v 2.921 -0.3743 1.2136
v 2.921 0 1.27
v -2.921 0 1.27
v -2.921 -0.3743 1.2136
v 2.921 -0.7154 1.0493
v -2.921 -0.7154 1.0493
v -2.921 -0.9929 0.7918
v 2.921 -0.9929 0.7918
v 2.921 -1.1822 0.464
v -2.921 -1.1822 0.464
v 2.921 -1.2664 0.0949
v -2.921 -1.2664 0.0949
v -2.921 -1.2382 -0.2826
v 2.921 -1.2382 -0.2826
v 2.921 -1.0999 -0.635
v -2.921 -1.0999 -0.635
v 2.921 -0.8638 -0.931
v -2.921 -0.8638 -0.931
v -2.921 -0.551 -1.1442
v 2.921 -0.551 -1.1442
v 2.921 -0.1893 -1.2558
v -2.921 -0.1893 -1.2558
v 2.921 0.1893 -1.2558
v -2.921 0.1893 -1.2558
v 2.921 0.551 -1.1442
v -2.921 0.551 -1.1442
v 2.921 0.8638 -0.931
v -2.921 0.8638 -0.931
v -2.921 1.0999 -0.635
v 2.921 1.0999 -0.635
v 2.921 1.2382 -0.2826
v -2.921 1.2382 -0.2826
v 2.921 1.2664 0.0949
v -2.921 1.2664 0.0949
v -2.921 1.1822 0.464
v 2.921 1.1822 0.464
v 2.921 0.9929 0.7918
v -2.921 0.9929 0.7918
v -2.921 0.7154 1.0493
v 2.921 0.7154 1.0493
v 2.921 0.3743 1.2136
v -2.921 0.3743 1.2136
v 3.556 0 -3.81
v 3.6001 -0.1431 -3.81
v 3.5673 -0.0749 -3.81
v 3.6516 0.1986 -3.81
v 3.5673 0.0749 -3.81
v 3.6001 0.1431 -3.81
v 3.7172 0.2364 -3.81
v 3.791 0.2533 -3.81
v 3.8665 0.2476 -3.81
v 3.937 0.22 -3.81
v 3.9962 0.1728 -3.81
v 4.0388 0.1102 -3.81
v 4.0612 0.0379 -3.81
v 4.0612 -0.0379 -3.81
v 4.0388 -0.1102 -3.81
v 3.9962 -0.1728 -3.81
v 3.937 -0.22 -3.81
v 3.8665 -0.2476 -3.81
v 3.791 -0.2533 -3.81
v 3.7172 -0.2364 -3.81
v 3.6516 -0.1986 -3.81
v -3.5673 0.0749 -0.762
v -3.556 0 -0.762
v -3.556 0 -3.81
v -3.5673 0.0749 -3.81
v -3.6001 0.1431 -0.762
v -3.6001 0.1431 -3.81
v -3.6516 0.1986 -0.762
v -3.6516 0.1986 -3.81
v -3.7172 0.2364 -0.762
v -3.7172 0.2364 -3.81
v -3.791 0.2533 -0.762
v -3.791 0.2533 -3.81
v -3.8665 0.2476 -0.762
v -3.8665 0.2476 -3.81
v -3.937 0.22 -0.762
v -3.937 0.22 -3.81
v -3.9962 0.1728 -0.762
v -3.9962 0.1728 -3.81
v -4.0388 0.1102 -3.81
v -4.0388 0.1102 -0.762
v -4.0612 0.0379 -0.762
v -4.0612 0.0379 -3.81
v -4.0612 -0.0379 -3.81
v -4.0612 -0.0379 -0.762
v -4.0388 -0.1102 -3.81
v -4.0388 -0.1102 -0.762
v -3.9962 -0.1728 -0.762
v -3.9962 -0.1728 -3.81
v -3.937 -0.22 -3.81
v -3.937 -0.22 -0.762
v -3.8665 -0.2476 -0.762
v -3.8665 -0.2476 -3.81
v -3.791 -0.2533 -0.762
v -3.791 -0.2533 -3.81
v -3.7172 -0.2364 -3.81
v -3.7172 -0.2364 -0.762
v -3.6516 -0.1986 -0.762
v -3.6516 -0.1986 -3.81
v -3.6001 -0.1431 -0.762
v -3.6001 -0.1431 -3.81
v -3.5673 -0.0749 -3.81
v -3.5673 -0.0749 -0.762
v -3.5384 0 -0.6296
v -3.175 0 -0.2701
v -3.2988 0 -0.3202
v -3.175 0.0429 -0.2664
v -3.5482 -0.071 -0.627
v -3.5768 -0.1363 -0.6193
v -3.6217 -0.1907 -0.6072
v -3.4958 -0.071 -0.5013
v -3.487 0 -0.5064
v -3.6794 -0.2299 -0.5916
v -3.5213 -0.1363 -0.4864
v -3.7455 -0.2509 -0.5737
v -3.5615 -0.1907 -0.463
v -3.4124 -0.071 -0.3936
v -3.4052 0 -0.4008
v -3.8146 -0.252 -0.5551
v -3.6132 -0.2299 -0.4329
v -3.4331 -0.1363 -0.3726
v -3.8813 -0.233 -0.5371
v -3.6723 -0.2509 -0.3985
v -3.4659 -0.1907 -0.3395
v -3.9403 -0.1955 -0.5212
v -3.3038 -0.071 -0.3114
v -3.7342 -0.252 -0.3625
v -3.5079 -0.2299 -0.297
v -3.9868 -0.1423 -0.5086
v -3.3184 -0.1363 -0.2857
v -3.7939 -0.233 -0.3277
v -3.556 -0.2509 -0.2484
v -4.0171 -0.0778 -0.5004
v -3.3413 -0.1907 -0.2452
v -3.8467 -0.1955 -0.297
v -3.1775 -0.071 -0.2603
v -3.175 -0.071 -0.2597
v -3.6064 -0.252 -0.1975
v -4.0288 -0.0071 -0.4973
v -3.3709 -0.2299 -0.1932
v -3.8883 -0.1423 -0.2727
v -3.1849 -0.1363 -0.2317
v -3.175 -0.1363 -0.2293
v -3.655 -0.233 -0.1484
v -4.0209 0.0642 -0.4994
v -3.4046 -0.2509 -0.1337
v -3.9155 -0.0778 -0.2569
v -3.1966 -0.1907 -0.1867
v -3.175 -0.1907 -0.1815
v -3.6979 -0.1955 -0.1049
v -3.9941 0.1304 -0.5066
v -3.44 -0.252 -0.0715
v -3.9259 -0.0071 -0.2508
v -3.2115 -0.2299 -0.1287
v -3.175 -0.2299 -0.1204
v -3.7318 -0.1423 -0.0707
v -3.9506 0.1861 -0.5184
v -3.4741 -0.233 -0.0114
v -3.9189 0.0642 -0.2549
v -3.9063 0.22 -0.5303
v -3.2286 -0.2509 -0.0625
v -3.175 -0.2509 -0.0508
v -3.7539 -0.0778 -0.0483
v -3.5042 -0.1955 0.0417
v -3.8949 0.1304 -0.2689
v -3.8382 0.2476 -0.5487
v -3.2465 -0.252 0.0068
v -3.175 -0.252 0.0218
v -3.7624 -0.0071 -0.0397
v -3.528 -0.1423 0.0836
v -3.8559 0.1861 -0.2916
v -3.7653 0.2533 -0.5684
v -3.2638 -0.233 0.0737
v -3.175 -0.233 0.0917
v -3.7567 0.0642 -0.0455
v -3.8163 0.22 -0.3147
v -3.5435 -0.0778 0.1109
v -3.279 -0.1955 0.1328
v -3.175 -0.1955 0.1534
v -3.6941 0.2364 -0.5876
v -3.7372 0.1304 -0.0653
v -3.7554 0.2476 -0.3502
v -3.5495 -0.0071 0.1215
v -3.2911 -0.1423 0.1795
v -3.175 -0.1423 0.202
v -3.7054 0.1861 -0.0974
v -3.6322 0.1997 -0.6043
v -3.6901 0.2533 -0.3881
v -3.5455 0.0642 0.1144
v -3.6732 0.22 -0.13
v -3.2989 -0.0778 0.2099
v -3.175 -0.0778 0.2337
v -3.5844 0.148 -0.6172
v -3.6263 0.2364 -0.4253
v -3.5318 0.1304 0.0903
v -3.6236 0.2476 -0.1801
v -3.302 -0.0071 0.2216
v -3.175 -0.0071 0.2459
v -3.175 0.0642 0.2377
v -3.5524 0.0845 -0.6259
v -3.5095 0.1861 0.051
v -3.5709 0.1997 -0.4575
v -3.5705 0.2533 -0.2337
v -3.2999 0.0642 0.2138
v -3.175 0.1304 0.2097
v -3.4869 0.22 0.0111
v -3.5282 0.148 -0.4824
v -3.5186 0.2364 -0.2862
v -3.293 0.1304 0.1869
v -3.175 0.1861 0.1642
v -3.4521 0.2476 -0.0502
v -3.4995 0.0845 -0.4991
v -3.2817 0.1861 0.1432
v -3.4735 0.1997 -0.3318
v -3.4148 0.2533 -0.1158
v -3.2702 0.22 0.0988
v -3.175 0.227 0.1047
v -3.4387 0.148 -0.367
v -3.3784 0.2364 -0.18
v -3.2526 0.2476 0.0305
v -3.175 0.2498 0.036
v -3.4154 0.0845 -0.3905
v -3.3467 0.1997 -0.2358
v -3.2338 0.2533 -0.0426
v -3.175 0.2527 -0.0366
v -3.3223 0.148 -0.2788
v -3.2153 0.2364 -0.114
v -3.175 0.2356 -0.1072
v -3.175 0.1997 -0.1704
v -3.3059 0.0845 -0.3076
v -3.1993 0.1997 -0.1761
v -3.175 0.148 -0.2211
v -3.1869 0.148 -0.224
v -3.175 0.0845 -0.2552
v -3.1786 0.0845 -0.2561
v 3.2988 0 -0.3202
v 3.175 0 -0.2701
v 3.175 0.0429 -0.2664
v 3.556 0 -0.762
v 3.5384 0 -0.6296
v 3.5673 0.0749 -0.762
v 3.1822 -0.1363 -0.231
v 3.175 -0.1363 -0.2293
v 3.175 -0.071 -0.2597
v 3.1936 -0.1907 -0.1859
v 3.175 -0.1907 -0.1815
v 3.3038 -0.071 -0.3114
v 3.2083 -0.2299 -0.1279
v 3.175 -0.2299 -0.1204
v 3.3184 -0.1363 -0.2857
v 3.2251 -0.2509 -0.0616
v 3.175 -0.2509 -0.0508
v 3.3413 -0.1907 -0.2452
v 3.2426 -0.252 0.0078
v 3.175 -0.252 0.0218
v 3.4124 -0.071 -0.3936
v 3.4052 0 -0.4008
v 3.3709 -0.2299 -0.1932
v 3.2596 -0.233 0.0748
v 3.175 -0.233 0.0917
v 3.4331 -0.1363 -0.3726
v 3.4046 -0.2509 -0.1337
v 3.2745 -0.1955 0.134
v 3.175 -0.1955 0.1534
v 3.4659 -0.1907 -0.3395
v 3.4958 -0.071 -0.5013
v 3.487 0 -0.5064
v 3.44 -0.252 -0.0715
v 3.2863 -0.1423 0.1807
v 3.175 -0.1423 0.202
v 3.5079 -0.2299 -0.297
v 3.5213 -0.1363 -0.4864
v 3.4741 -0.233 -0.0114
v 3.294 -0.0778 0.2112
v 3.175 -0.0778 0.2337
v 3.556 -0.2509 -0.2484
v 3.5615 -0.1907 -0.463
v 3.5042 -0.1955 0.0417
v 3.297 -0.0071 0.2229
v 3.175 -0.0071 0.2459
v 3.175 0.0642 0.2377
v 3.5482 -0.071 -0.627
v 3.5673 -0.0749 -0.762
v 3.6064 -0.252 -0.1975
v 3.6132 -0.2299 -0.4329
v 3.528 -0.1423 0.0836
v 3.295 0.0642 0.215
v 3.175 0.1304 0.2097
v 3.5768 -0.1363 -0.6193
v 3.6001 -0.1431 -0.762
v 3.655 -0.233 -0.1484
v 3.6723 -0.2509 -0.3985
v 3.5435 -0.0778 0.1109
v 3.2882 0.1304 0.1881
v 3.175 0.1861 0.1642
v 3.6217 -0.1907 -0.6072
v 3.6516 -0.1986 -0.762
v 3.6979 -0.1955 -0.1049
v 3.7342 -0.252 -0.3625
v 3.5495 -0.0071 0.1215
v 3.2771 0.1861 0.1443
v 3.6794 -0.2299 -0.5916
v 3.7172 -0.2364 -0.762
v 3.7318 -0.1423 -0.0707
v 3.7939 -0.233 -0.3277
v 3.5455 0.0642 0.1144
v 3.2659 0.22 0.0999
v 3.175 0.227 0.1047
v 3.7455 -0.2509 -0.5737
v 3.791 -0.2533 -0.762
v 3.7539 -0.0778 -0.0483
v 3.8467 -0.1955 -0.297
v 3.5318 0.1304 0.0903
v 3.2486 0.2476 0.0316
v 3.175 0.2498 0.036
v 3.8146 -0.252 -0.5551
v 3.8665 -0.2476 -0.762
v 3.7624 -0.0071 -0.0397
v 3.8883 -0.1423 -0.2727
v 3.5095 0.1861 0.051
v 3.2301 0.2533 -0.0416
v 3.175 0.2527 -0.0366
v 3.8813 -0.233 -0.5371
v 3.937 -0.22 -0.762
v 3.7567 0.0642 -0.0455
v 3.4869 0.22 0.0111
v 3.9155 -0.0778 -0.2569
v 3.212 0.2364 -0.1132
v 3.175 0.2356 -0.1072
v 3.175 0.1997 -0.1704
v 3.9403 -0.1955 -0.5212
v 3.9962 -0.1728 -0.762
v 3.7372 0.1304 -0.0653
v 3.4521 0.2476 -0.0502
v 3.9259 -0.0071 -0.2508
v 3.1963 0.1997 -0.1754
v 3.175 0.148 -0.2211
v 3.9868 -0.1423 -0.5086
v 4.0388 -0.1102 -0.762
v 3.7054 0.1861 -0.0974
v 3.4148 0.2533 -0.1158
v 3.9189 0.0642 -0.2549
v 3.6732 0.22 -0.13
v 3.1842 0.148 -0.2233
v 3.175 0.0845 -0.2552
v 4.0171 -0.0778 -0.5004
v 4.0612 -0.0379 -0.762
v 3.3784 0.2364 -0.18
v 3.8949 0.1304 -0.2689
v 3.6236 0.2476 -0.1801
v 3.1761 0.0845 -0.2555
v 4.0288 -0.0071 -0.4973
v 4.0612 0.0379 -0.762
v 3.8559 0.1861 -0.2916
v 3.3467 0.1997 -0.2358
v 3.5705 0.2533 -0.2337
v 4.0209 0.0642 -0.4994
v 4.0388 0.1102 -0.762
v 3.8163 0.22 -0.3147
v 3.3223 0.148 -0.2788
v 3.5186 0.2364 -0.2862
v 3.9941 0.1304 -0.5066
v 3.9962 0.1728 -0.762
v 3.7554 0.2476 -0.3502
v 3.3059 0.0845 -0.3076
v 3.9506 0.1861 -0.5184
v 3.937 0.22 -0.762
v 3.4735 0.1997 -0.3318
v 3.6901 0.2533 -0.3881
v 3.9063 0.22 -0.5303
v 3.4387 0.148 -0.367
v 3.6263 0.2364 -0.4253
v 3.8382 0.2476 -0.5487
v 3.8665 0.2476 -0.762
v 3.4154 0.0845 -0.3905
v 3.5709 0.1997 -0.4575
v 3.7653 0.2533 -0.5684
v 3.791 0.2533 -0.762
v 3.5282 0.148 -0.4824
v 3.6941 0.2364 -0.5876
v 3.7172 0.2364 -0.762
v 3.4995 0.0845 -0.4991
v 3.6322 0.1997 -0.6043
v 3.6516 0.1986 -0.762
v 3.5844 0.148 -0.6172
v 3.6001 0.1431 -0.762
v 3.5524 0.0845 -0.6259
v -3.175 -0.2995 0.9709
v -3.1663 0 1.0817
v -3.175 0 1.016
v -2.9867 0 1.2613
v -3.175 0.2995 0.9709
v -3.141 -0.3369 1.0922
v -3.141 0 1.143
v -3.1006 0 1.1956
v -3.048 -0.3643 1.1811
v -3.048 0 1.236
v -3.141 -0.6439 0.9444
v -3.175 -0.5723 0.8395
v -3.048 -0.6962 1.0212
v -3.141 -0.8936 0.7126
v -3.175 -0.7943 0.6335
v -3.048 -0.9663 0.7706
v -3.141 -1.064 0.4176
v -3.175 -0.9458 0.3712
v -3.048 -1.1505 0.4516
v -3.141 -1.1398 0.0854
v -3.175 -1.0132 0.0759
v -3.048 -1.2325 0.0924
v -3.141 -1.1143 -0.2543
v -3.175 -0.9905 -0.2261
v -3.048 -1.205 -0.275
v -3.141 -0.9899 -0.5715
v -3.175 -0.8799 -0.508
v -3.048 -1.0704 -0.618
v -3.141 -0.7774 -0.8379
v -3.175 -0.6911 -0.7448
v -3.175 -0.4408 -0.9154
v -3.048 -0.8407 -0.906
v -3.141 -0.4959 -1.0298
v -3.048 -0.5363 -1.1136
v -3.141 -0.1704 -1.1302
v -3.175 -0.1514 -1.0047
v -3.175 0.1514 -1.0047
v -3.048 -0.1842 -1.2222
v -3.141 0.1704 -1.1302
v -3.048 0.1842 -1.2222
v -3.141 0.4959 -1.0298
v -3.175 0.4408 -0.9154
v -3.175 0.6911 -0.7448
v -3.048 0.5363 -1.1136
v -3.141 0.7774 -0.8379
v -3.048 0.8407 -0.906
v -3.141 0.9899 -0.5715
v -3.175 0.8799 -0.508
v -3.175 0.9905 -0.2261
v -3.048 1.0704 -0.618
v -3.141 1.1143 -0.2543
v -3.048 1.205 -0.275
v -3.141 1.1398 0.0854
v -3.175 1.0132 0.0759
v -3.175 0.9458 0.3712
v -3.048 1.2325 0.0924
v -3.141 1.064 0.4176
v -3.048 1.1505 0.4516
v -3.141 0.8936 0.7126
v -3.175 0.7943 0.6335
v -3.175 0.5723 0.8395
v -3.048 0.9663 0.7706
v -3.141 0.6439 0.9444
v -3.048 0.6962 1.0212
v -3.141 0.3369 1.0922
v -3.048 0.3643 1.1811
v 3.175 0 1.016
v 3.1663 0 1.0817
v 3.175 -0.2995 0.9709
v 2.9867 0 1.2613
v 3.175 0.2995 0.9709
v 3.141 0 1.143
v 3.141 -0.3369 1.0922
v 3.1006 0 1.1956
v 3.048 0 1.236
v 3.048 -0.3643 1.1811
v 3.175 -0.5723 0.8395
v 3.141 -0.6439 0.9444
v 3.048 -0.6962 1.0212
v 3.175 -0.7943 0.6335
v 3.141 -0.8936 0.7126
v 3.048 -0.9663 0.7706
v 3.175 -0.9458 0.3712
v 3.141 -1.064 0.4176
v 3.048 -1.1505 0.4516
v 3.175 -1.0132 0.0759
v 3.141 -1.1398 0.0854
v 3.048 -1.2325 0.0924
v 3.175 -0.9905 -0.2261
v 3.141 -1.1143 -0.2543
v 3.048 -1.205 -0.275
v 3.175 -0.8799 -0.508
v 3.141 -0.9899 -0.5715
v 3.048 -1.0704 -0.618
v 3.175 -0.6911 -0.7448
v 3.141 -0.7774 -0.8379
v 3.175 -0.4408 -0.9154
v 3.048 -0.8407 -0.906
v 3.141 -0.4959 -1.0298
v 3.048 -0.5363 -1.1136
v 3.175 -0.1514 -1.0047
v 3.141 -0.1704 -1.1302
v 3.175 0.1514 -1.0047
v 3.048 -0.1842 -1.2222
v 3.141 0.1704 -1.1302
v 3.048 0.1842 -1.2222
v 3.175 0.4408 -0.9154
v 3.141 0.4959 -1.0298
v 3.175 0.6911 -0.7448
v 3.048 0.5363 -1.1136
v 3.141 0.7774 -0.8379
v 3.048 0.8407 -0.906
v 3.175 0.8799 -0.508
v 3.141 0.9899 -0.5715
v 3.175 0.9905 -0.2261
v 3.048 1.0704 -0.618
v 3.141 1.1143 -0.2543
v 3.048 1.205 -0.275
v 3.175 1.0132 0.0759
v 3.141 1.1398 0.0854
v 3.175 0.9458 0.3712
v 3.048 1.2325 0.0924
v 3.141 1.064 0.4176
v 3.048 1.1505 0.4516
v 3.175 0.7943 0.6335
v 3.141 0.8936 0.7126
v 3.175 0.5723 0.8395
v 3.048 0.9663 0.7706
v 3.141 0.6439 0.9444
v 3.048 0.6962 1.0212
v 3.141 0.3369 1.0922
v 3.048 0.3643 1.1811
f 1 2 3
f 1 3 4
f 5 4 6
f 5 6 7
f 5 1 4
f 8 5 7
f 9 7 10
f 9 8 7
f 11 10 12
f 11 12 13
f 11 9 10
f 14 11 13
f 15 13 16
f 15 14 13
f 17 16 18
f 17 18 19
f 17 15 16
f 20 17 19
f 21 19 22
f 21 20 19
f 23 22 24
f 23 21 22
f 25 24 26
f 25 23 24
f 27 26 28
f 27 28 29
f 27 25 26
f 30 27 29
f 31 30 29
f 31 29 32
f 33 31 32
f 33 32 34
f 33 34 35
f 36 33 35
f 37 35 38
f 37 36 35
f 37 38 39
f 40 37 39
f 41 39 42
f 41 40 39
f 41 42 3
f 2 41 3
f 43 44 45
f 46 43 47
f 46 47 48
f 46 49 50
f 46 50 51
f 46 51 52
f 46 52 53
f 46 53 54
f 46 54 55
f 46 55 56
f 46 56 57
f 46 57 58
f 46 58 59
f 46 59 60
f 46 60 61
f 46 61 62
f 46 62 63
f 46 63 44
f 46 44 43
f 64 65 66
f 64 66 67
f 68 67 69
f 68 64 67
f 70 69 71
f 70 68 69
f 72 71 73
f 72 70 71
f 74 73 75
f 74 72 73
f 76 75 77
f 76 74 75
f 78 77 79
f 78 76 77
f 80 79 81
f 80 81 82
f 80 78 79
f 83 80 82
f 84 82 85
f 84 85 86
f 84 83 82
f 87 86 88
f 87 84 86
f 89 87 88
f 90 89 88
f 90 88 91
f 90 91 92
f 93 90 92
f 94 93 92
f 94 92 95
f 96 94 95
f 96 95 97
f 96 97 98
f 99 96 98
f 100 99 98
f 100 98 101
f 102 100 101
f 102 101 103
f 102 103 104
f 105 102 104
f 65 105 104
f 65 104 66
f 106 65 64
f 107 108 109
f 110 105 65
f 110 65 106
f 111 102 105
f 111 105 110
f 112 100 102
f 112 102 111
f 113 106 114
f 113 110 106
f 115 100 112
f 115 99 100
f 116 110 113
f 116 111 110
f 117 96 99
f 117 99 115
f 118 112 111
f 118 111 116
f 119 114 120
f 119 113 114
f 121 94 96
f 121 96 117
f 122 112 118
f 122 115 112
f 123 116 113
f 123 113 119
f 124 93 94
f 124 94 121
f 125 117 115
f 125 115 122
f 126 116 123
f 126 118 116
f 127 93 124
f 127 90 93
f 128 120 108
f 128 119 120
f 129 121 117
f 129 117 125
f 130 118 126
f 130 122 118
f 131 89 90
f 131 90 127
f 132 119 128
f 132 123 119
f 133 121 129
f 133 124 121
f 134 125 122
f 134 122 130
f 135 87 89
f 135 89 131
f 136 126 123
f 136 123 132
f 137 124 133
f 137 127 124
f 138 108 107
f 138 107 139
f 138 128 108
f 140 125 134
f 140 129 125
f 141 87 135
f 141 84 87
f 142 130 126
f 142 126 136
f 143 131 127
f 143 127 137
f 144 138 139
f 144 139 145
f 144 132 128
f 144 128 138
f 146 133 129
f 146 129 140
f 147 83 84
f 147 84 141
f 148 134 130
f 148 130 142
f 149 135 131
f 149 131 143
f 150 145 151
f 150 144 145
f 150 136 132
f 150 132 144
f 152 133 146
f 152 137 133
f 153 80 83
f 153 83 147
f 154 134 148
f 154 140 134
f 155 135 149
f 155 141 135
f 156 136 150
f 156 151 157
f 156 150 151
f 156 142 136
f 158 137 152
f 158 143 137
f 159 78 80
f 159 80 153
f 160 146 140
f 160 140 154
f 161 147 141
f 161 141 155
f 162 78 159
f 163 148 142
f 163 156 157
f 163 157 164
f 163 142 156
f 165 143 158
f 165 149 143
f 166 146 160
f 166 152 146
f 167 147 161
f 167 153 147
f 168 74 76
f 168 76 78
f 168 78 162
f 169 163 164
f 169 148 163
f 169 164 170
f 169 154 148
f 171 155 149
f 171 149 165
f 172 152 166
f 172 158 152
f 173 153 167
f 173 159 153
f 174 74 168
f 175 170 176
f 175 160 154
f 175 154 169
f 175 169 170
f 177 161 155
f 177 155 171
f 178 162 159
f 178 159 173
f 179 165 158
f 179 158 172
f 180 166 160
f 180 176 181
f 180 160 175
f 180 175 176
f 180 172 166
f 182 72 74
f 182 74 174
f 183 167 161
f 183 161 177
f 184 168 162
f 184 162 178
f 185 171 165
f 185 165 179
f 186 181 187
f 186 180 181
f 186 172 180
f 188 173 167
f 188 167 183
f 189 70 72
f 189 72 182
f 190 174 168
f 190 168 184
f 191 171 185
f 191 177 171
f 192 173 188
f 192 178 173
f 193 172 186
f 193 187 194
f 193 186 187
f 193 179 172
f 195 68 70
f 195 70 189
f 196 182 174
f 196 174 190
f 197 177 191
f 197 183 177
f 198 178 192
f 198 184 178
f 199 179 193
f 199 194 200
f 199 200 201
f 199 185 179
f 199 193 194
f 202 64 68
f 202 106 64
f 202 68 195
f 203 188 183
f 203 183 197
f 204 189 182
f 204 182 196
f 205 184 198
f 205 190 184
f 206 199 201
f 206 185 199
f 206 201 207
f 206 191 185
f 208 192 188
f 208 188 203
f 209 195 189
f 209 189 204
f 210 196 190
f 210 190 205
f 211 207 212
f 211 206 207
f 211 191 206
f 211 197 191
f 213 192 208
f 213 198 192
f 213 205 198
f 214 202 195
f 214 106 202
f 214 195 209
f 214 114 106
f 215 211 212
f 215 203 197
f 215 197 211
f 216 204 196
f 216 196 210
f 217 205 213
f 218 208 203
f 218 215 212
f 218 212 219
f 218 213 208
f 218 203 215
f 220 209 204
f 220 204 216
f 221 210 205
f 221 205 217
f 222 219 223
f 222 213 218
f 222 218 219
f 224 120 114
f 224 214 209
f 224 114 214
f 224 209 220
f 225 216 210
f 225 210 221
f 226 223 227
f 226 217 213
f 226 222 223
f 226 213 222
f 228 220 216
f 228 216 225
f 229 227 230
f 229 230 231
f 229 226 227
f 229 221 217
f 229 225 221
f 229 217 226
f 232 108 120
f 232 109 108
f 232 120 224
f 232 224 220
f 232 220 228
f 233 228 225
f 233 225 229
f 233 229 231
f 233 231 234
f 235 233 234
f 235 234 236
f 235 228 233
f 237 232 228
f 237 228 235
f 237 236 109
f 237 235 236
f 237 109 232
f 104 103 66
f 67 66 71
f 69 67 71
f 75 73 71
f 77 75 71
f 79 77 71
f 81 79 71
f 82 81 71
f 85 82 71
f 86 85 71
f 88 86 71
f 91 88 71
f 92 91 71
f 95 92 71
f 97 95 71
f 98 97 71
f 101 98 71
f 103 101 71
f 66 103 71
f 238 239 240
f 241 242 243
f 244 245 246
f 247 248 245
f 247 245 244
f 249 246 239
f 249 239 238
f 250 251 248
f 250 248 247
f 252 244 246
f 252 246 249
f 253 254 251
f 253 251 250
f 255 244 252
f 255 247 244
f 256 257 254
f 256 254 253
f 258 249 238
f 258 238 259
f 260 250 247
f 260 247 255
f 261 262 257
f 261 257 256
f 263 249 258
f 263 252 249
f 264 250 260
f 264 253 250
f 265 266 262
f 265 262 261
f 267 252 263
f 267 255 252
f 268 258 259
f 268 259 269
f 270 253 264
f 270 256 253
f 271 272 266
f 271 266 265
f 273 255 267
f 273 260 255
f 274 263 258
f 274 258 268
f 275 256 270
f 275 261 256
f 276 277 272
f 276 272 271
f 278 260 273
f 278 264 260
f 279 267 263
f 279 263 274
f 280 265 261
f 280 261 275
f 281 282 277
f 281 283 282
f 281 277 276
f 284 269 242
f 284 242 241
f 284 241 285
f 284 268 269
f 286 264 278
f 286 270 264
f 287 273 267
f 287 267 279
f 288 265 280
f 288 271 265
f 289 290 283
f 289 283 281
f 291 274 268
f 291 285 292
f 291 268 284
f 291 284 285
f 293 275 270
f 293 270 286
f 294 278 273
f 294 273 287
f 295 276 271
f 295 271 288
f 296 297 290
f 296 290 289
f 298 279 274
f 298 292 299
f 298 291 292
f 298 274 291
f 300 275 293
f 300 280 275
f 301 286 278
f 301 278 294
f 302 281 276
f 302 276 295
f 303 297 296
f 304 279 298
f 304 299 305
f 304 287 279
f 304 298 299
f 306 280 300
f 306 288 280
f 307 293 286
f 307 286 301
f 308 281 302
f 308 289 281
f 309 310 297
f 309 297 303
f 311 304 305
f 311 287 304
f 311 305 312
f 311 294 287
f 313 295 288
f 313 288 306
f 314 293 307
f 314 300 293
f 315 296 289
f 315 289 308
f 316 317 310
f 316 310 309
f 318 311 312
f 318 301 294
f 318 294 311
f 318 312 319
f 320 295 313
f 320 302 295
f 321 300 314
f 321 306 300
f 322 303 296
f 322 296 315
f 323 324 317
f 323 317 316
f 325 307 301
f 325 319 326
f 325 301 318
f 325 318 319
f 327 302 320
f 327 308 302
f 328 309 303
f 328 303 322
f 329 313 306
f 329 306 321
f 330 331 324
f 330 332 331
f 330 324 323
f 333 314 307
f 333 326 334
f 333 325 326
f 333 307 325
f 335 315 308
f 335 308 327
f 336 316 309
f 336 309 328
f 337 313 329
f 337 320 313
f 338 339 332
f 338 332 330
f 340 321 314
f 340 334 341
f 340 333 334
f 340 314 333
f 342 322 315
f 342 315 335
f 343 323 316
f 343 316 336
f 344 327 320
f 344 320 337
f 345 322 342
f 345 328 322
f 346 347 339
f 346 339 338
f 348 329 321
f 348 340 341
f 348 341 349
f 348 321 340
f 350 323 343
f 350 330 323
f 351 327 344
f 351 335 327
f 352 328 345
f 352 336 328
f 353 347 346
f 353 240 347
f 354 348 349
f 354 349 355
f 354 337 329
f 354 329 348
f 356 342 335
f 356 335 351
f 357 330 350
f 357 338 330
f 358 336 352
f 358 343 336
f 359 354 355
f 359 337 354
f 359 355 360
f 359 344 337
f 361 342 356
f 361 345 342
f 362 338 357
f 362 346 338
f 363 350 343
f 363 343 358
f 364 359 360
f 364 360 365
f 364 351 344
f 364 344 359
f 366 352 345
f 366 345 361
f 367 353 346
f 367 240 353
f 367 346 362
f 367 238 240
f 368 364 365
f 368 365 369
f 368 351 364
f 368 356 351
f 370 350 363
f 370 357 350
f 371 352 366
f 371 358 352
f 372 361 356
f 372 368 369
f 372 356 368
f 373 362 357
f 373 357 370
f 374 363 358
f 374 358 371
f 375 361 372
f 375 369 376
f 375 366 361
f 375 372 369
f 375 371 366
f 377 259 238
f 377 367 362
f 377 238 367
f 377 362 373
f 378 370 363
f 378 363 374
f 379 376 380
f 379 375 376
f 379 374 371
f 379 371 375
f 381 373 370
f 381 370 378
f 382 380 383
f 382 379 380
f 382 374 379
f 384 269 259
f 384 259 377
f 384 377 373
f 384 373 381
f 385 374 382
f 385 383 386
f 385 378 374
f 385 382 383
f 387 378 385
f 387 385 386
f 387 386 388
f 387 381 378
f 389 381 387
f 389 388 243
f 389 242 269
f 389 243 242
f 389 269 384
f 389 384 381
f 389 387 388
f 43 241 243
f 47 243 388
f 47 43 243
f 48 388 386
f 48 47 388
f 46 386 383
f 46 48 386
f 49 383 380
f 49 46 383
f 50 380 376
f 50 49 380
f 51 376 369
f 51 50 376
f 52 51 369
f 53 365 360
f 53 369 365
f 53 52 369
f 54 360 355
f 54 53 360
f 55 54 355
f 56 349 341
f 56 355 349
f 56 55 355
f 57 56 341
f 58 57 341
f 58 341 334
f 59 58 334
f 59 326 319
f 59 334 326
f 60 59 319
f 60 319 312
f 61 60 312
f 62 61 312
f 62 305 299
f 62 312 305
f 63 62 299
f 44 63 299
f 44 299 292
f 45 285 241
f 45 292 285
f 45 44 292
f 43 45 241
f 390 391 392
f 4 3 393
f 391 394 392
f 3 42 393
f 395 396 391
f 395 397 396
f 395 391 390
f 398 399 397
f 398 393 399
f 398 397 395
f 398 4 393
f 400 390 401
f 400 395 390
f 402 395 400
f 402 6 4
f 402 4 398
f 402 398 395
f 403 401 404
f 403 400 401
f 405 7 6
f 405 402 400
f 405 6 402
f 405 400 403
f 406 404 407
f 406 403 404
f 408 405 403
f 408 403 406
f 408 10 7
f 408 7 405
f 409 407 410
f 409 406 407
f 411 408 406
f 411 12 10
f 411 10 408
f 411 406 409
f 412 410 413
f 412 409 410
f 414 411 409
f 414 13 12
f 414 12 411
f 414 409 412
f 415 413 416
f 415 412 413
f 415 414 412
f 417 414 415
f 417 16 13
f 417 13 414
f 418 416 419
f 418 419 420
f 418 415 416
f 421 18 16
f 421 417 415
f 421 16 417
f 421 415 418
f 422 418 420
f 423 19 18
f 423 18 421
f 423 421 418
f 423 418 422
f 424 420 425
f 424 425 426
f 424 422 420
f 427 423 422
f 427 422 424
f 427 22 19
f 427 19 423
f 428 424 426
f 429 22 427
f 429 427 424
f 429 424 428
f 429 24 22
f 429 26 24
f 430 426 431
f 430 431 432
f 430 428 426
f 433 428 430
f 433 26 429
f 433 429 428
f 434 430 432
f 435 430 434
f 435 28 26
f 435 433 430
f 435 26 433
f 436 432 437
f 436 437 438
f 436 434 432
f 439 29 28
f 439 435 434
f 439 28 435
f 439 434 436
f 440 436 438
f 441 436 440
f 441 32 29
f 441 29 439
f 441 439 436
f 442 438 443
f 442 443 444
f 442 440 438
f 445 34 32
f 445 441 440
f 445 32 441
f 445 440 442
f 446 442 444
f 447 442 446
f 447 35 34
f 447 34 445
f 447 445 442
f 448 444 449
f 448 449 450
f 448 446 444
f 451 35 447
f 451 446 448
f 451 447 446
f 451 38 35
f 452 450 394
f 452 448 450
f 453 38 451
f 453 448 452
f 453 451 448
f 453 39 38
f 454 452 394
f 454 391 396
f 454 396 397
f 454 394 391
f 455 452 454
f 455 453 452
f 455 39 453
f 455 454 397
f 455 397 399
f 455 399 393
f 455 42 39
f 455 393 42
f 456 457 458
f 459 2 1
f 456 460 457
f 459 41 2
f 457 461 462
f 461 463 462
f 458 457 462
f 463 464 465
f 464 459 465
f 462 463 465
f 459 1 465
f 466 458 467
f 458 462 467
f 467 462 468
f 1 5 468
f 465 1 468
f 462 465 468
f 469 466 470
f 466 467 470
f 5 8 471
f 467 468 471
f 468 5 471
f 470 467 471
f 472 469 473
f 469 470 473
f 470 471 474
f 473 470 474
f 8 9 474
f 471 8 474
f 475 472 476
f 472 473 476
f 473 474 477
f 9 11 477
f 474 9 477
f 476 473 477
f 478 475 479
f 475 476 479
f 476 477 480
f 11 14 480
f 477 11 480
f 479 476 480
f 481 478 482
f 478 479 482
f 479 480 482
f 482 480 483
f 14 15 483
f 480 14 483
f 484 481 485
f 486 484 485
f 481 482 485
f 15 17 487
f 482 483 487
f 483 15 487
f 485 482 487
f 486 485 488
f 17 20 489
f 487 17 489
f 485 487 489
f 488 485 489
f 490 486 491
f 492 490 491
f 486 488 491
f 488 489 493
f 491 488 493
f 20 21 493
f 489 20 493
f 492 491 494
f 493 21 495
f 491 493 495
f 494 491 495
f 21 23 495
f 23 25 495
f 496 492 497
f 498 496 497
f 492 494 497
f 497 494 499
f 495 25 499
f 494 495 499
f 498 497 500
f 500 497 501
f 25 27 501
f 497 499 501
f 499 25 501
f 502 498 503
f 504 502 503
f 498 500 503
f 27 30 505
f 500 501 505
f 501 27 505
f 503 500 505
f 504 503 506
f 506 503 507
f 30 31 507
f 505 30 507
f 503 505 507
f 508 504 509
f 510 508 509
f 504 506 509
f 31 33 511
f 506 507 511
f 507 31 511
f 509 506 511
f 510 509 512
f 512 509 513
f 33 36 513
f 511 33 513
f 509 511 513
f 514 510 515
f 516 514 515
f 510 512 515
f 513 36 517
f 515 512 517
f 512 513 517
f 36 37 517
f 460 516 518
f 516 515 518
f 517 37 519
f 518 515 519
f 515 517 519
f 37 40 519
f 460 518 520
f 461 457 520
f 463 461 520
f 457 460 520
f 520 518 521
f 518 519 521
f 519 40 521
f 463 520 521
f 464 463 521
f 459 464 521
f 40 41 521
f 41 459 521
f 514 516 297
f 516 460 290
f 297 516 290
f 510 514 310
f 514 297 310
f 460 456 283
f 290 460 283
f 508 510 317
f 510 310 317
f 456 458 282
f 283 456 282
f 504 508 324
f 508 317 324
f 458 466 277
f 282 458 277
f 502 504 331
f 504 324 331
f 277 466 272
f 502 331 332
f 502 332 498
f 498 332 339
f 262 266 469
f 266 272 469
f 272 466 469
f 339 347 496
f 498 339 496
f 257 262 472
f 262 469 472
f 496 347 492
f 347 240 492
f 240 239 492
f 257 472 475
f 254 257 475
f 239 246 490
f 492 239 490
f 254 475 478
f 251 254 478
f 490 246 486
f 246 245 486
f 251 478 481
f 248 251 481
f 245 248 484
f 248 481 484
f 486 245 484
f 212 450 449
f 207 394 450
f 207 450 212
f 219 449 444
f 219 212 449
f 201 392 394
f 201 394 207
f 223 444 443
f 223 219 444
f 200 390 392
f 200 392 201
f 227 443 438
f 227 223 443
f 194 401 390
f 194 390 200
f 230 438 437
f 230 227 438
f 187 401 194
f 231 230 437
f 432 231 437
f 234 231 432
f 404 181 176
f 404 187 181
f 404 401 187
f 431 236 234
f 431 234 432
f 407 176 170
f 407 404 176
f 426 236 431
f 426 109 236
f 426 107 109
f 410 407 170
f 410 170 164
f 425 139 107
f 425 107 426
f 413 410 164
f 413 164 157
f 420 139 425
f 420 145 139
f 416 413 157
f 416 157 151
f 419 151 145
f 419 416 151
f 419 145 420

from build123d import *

# Parameters (mm, degrees)
F0_W = 6.35
F0_H = 1.27
F2_R = 0.254
F5_R = 0.254


with BuildPart() as f1:
    # F0 (on Front) → F1 (revolve)
    with BuildSketch(Plane.XZ):
        with Locations((0, 0.635)):
            Rectangle(F0_W, F0_H)
    revolve(axis=Axis((0, 0, 0), (1, 0, 0)))

    # F2
    f2_edges = [f1.edges().sort_by_distance(p)[0] for p in [
        (3.175, 0, -1.27),
        (-3.175, 0, -1.27),
    ]]
    fillet(f2_edges, radius=F2_R)

    # F6: sweep along a path in F3
    with BuildLine(Plane.XZ) as f6_path:
        Line((-3.81, -3.81), (-3.81, -0.762))
        ThreePointArc((-3.81, -0.762), (-3.5868153673, -0.2231846327), (-3.048, 0))
        Line((-3.048, 0), (3.048, 0))
        ThreePointArc((3.048, 0), (3.5868153673, -0.2231846327), (3.81, -0.762))
        Line((3.81, -0.762), (3.81, -3.81))
    # F5 (on offset) → F6 (sweep)
    with BuildSketch(Plane.XY.offset(-3.81)):
        with Locations((-3.81, 0)):
            Circle(F5_R)
    sweep(path=f6_path.line)


solid = f1.part
